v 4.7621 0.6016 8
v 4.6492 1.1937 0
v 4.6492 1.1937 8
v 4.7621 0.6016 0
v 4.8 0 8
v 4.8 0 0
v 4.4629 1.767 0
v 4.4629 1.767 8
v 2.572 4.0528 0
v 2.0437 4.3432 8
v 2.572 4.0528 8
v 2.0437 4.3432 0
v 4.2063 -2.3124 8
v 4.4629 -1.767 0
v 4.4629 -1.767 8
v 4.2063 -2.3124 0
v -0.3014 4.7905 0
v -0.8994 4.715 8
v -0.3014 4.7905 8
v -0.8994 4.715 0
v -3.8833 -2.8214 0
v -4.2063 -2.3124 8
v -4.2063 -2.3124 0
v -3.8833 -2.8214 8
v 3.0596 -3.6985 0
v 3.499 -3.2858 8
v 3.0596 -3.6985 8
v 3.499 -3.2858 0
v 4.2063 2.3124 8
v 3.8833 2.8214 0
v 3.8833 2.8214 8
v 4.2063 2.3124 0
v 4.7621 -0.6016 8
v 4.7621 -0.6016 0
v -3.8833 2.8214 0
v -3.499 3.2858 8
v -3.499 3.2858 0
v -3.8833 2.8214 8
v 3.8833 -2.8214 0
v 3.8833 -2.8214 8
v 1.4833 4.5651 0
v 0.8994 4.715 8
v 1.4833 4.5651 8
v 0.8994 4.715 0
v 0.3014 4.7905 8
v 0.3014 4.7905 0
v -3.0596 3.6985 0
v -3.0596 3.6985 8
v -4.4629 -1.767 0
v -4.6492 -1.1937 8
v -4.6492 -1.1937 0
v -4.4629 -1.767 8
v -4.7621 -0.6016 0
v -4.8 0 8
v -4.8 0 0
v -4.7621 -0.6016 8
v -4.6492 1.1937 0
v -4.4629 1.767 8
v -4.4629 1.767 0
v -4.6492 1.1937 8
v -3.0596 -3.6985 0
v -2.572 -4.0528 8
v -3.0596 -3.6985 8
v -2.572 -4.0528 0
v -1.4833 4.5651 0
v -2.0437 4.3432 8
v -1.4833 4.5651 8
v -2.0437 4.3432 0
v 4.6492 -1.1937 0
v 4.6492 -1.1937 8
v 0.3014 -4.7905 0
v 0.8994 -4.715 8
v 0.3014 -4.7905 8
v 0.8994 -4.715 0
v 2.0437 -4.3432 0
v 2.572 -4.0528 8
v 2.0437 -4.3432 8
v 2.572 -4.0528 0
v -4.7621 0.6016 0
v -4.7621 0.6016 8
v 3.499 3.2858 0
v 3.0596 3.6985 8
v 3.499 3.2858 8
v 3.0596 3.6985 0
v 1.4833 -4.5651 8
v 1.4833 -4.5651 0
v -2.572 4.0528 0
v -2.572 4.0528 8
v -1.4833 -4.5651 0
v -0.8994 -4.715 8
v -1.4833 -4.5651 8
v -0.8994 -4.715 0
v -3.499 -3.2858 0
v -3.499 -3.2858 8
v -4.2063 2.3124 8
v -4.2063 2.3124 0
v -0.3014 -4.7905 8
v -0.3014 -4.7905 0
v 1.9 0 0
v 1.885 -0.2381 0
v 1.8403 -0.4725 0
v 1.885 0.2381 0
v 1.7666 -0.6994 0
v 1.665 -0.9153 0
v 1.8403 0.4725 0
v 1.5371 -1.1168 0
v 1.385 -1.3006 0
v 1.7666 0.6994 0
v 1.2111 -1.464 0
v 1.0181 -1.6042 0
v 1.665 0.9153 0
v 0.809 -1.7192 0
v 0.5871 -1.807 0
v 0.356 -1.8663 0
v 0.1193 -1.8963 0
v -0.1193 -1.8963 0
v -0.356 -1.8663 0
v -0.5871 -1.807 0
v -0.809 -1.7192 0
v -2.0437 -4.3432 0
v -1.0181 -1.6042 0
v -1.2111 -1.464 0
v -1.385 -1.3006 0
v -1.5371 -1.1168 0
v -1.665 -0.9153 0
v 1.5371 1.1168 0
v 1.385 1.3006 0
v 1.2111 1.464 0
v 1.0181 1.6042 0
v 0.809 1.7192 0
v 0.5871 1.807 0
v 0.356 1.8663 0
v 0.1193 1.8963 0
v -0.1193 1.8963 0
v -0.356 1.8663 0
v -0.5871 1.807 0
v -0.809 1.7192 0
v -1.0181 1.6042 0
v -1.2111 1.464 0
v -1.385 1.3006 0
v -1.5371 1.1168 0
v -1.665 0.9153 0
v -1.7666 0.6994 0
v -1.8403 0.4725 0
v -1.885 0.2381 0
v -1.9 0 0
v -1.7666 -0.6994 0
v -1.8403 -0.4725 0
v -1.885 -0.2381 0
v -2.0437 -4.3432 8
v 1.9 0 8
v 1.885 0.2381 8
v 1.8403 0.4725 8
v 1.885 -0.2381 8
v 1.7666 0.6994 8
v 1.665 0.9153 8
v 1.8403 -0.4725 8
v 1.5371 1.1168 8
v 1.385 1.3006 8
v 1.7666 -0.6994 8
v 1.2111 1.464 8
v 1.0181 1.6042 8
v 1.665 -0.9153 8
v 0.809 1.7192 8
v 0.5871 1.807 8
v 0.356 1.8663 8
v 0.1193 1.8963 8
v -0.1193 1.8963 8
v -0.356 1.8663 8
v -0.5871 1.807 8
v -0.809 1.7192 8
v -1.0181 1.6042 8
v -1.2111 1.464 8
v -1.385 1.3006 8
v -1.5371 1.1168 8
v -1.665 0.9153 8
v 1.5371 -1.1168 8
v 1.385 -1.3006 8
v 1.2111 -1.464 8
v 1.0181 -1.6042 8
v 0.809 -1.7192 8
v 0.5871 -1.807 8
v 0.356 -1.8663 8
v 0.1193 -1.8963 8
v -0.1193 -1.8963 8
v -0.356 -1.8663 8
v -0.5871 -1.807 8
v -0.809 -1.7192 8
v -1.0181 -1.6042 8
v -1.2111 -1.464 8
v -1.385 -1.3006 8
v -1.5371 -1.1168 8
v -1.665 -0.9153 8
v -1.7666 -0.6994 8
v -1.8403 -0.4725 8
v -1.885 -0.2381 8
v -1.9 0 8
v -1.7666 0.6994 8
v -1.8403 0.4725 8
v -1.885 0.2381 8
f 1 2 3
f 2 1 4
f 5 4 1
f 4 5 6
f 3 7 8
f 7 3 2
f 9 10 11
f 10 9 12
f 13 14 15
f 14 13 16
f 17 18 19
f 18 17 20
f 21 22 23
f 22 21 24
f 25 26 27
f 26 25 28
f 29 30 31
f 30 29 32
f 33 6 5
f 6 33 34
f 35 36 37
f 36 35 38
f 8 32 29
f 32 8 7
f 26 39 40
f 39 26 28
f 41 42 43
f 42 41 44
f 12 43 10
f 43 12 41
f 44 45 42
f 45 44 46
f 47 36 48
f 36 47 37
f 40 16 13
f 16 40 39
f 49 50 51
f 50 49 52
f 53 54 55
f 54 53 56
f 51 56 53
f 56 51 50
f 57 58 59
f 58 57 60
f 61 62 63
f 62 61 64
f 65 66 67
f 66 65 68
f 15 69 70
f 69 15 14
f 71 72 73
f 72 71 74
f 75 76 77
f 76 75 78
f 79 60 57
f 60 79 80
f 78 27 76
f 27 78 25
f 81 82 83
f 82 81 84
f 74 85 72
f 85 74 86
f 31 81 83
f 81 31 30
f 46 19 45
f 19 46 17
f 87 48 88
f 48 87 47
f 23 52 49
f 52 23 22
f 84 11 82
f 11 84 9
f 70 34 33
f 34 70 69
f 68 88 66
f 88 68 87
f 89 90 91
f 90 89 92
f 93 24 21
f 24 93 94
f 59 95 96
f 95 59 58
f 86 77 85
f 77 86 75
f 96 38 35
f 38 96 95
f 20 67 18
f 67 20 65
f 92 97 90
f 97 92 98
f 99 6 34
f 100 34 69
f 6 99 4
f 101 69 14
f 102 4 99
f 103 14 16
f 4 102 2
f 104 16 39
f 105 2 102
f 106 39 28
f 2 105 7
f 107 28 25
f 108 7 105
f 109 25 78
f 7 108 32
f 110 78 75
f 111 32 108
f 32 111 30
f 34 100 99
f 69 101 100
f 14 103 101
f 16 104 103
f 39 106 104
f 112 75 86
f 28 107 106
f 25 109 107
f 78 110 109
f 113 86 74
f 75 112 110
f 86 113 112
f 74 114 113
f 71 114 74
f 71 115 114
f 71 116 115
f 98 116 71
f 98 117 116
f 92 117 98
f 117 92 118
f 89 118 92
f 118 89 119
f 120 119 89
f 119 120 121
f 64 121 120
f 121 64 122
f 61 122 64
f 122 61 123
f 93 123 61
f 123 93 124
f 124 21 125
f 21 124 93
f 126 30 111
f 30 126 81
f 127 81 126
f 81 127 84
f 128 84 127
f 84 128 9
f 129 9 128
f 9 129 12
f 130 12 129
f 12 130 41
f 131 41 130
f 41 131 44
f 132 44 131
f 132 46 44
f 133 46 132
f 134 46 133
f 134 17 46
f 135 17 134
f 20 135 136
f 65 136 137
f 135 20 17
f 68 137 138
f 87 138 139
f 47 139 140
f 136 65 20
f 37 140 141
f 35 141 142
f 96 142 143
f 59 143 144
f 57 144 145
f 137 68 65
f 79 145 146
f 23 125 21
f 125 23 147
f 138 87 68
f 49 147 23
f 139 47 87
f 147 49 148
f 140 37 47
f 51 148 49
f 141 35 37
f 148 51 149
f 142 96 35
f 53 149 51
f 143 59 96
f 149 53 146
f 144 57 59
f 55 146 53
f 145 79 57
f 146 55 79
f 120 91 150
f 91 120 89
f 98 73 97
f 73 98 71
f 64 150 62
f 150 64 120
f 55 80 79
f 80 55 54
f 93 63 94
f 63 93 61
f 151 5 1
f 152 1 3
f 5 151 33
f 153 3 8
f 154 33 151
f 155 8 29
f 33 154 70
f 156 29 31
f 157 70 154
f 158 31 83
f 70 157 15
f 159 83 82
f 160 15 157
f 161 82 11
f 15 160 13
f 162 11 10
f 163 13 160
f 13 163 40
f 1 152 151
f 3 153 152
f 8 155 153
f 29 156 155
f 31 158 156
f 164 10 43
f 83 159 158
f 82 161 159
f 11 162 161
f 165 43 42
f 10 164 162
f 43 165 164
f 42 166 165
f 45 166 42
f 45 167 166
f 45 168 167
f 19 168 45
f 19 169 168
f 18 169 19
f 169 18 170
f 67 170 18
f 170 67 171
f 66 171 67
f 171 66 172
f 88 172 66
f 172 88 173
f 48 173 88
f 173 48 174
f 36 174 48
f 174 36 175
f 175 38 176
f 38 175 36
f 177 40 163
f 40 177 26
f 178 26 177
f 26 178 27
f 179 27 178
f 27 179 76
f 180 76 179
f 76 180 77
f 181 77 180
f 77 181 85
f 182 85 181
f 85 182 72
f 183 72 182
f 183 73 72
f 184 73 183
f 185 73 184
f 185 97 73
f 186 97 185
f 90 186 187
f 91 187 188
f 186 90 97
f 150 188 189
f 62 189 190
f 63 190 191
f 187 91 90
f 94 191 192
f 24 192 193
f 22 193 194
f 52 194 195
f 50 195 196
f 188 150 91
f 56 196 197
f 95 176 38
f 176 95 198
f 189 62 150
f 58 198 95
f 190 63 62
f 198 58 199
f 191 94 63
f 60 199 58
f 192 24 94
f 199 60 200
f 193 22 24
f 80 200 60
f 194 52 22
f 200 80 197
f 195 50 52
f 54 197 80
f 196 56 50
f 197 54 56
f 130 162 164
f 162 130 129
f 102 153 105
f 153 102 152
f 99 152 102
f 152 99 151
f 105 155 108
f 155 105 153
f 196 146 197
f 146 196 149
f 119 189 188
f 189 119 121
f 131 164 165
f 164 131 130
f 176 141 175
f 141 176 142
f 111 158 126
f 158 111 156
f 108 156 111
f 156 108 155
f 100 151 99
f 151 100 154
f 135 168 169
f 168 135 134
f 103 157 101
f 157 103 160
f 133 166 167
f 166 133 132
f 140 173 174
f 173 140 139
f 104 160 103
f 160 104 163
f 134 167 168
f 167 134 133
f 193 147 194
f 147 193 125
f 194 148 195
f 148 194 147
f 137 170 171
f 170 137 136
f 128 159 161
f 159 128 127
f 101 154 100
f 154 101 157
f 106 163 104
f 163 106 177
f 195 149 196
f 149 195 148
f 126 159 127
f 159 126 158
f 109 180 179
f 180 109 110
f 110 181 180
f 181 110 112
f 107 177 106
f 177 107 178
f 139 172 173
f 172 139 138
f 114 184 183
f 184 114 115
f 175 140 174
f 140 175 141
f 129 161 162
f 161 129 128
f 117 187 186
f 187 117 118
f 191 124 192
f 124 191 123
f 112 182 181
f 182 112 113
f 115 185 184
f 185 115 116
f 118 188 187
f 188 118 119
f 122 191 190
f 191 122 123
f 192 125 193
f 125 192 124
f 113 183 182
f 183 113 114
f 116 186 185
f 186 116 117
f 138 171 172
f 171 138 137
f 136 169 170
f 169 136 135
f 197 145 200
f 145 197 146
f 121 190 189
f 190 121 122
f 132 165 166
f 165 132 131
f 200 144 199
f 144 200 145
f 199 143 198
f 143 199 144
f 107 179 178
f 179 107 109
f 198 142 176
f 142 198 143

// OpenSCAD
//Spacer v1.0 by Guillermo Ramírez

height = 8;
extRadius = 4.8;
holeRadius = 1.9;
$fn = 50;

difference(){
    cylinder(height, extRadius, extRadius);
    cylinder(3*height, holeRadius, holeRadius, center=true);
}
